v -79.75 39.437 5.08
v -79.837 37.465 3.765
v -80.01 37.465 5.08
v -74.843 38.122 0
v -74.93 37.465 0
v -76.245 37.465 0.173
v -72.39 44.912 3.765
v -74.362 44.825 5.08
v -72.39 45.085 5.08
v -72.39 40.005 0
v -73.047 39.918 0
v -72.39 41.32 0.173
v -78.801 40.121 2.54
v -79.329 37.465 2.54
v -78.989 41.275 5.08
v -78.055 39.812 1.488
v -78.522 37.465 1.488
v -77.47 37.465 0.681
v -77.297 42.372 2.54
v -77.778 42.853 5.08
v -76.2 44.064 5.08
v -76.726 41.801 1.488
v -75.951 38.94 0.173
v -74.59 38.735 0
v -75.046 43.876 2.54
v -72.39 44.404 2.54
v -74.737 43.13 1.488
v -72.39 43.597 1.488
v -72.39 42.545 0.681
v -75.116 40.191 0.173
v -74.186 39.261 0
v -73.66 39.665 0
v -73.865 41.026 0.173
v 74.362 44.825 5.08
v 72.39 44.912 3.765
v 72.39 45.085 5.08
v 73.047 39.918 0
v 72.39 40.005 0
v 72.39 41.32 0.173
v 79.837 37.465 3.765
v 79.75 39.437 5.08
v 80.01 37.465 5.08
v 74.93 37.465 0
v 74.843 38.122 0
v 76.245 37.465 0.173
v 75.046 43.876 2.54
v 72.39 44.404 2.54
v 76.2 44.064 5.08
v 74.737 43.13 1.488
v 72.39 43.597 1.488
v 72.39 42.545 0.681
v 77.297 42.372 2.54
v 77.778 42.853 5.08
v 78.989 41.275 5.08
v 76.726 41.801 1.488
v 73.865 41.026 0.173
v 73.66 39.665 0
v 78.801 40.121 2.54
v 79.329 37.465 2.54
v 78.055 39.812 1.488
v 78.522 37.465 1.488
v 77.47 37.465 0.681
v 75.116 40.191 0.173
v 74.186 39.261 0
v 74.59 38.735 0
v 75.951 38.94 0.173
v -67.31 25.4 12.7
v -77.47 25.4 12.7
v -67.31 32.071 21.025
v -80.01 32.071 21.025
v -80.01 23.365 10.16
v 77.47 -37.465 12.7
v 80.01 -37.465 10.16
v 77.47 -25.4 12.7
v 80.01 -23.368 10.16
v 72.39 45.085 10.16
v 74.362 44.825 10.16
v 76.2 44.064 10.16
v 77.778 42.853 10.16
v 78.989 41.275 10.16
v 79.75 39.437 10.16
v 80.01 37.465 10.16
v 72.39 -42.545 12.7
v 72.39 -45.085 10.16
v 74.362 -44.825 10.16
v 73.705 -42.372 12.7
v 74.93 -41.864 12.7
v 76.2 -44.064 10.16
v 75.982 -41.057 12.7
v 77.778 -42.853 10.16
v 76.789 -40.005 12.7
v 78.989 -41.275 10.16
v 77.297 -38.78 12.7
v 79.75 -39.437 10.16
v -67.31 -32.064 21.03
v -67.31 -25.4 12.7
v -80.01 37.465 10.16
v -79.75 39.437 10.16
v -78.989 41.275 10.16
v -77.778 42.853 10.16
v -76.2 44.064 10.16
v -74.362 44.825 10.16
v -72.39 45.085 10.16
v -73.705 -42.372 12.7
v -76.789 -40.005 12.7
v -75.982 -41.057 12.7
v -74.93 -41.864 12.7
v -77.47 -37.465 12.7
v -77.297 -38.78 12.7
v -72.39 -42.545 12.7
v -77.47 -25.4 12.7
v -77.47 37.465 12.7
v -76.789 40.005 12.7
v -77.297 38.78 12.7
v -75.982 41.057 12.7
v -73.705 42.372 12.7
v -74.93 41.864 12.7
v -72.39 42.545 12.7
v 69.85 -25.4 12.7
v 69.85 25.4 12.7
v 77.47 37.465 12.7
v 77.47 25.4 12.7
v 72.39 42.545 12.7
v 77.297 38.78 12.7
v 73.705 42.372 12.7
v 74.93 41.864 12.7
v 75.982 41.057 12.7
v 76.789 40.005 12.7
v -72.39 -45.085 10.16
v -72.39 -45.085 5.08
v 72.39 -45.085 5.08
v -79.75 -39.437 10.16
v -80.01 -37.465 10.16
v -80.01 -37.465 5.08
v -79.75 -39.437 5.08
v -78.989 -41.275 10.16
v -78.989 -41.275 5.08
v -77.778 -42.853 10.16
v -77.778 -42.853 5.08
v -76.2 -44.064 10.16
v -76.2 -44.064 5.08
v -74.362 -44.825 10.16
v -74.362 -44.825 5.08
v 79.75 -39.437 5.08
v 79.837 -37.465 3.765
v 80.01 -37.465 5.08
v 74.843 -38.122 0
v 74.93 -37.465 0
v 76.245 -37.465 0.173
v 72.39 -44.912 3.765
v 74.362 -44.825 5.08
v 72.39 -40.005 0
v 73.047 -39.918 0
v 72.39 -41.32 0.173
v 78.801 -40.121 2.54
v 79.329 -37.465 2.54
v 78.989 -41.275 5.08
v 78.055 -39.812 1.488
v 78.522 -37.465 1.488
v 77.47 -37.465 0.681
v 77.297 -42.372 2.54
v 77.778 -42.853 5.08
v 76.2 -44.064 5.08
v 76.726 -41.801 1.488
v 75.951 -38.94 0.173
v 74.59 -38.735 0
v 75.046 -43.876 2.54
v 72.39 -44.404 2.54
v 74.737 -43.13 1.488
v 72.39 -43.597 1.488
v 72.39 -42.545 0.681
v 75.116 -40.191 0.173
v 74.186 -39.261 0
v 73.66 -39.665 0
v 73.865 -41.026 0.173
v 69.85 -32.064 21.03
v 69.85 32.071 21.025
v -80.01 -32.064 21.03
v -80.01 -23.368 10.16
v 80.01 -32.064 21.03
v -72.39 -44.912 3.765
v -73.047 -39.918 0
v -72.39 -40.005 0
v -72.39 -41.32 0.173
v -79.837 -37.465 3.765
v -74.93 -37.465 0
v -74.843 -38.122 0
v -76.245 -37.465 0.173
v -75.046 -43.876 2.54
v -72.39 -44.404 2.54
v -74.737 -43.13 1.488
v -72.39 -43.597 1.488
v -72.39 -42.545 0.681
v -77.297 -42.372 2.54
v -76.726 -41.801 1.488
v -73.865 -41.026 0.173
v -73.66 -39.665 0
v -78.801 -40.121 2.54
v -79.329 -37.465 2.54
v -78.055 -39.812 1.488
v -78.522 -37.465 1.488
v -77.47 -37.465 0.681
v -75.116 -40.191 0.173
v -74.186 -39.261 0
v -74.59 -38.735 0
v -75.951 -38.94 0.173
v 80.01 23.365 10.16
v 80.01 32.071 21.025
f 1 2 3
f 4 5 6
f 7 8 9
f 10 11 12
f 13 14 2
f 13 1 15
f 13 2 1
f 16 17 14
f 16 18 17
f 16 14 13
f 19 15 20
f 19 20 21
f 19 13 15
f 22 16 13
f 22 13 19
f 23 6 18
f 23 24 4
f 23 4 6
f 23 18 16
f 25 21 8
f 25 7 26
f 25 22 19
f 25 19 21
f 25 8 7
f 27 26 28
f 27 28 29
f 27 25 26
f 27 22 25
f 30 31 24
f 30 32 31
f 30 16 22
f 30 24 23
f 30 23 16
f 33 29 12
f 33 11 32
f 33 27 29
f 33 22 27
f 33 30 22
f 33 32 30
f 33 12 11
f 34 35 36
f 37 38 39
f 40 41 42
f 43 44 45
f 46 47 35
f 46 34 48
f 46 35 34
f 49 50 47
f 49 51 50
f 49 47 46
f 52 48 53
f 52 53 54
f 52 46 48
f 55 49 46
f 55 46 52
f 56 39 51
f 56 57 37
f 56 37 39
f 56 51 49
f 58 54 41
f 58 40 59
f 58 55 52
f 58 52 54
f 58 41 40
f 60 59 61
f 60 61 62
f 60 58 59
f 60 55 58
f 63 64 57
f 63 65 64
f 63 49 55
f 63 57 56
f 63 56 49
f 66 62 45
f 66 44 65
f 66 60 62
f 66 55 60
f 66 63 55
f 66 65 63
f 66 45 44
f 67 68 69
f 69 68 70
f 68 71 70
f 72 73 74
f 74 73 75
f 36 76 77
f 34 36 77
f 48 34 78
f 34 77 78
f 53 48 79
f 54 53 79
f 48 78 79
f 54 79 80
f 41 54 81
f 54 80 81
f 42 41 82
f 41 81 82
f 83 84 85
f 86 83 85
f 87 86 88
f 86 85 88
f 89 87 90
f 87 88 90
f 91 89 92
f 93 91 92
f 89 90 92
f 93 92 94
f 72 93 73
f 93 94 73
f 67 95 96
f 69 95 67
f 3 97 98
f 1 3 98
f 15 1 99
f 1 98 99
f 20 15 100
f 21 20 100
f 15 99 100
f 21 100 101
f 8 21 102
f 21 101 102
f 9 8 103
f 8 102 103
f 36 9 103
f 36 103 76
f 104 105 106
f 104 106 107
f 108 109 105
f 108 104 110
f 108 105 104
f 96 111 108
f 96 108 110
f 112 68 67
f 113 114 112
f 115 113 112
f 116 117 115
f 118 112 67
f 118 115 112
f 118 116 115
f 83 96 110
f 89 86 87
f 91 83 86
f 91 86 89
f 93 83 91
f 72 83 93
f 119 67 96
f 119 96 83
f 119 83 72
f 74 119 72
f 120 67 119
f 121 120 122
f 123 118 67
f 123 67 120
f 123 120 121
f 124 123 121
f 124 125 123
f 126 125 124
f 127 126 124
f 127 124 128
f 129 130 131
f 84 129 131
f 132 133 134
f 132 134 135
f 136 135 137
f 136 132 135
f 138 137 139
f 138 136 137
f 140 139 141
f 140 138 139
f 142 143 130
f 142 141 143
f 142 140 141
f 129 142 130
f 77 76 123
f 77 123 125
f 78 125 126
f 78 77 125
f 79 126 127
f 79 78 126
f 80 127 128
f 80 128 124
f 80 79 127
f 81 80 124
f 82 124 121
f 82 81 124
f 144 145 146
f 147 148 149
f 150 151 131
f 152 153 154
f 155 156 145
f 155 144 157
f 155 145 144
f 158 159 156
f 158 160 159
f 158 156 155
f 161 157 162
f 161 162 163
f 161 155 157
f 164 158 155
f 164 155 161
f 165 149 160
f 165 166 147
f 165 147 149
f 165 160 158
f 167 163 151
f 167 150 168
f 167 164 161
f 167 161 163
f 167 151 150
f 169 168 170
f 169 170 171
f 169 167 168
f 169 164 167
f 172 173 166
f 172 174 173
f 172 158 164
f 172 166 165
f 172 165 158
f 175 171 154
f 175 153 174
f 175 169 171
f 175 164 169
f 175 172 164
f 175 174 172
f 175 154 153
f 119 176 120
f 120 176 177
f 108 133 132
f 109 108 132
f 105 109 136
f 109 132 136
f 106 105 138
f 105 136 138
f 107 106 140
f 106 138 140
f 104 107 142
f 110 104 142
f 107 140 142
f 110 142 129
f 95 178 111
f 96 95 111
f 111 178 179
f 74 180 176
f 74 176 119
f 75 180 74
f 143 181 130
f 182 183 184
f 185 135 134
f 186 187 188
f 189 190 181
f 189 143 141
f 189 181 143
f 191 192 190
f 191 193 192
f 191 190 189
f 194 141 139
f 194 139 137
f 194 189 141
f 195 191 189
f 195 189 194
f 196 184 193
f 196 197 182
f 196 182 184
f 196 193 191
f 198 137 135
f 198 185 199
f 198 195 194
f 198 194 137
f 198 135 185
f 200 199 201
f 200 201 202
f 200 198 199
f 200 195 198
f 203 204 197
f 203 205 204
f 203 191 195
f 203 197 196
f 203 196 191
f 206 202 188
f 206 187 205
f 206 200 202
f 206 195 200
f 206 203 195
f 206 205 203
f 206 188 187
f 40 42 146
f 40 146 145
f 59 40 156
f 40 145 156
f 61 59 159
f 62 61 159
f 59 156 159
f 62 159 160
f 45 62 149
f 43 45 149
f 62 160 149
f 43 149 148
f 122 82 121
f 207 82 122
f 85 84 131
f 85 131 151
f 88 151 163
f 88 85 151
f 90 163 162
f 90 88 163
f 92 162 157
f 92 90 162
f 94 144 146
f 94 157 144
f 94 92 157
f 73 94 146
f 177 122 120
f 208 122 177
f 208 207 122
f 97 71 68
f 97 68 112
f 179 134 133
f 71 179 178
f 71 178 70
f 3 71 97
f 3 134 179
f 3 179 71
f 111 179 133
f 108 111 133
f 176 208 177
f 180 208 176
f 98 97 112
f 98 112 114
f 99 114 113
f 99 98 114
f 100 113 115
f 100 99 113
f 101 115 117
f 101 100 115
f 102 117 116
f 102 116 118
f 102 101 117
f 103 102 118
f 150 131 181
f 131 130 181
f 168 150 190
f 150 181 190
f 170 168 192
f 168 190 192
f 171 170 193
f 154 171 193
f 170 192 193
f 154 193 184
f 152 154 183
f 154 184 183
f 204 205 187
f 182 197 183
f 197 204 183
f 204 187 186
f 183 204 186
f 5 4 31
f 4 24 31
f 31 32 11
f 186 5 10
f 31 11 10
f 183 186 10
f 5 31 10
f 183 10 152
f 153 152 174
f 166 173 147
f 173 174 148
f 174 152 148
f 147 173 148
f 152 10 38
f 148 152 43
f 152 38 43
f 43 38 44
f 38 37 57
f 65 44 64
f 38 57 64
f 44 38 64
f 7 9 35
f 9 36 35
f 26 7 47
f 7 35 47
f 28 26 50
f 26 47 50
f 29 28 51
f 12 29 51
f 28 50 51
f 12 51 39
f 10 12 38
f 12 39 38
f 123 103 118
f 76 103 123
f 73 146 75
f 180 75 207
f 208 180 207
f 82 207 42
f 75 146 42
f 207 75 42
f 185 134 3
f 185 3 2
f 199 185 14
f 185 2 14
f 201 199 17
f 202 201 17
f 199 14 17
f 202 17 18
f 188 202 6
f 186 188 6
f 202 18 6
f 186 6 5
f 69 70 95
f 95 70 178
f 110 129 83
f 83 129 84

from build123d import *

# Parameters (mm, degrees)
F0_W      = 149.86
F0_H      = 80.01
F1_DEPTH  = 12.7
F0_W_2    = 160.02
F0_H_2    = 90.17
F2_DEPTH  = 12.7
F3_R      = 7.62
F4_R      = 5.08
F7_W      = 50.8
F7_H      = 6.35
F8_DEPTH  = 12.7
F9_W      = 50.8
F9_H      = 6.35
F10_DEPTH = 10.16
F11_SIZE  = 2.54


# Not quite as in the source:
# - a feature names something its author has since deleted; it is built from what else it names


with BuildPart() as f1:
    # F0 (on Top) → F1 (new body)
    with BuildSketch(Plane.XY):
        Rectangle(F0_W, F0_H)
    extrude(amount=F1_DEPTH)

    # F0 (on Top) → F2 (join)
    with BuildSketch(Plane.XY):
        Rectangle(F0_W_2, F0_H_2)
        Rectangle(F0_W, F0_H, mode=Mode.SUBTRACT)
    extrude(amount=F2_DEPTH)

    # F3
    f3_edges = [f1.edges().sort_by_distance(p)[0] for p in [
        (-80.01, 45.085, 6.35),
        (-80.01, -45.085, 6.35),
        (80.01, -45.085, 6.35),
        (80.01, 45.085, 6.35),
    ]]
    fillet(f3_edges, radius=F3_R)

    # F4
    f4_edges = [f1.edges().sort_by_distance(p)[0] for p in [
        (-80.01, 0, 0),
        (0, 45.085, 0),
        (80.01, 0, 0),
        (77.778154, 42.853154, 0),
        (77.778154, -42.853154, 0),
        (-77.778154, -42.853154, 0),
        (0, -45.085, 0),
        (-77.778154, 42.853154, 0),
    ]]
    fillet(f4_edges, radius=F4_R)

    # F7 (on face) → F8 (join)
    with BuildSketch(Plane.YZ.offset(-80.01)):
        Polygon((32.0707530211, 21.0250992866), (-32.0642467673, 21.0303084591), (-25.4, 12.7), (-25.4, 19.05), (25.4, 19.05), (25.4, 12.7), align=None)
        with Locations((0, 15.875)):
            Rectangle(F7_W, F7_H)
    extrude(amount=F8_DEPTH)

    # F9 (on face) → F10 (join)
    with BuildSketch(Plane.YZ.offset(80.01)):
        Polygon((32.0707530211, 21.0250992866), (-32.0642467673, 21.0303084591), (-25.4, 12.7), (-25.4, 19.05), (25.4, 19.05), (25.4, 12.7), align=None)
        with Locations((0, 15.875)):
            Rectangle(F9_W, F9_H)
    extrude(amount=-F10_DEPTH)

    # F11
    f11_edges = [f1.edges().sort_by_distance(p)[0] for p in [
        (0, 45.085, 12.7),
        (0, -45.085, 12.7),
        (-80.01, 31.4325, 12.7),
        (-80.01, -31.4325, 12.7),
        (-77.778154, 42.853154, 12.7),
        (-77.778154, -42.853154, 12.7),
        (77.778154, 42.853154, 12.7),
        (77.778154, -42.853154, 12.7),
        (80.01, -31.4325, 12.7),
        (80.01, 31.4325, 12.7),
    ]]
    chamfer(f11_edges, length=F11_SIZE)


solid = f1.part
